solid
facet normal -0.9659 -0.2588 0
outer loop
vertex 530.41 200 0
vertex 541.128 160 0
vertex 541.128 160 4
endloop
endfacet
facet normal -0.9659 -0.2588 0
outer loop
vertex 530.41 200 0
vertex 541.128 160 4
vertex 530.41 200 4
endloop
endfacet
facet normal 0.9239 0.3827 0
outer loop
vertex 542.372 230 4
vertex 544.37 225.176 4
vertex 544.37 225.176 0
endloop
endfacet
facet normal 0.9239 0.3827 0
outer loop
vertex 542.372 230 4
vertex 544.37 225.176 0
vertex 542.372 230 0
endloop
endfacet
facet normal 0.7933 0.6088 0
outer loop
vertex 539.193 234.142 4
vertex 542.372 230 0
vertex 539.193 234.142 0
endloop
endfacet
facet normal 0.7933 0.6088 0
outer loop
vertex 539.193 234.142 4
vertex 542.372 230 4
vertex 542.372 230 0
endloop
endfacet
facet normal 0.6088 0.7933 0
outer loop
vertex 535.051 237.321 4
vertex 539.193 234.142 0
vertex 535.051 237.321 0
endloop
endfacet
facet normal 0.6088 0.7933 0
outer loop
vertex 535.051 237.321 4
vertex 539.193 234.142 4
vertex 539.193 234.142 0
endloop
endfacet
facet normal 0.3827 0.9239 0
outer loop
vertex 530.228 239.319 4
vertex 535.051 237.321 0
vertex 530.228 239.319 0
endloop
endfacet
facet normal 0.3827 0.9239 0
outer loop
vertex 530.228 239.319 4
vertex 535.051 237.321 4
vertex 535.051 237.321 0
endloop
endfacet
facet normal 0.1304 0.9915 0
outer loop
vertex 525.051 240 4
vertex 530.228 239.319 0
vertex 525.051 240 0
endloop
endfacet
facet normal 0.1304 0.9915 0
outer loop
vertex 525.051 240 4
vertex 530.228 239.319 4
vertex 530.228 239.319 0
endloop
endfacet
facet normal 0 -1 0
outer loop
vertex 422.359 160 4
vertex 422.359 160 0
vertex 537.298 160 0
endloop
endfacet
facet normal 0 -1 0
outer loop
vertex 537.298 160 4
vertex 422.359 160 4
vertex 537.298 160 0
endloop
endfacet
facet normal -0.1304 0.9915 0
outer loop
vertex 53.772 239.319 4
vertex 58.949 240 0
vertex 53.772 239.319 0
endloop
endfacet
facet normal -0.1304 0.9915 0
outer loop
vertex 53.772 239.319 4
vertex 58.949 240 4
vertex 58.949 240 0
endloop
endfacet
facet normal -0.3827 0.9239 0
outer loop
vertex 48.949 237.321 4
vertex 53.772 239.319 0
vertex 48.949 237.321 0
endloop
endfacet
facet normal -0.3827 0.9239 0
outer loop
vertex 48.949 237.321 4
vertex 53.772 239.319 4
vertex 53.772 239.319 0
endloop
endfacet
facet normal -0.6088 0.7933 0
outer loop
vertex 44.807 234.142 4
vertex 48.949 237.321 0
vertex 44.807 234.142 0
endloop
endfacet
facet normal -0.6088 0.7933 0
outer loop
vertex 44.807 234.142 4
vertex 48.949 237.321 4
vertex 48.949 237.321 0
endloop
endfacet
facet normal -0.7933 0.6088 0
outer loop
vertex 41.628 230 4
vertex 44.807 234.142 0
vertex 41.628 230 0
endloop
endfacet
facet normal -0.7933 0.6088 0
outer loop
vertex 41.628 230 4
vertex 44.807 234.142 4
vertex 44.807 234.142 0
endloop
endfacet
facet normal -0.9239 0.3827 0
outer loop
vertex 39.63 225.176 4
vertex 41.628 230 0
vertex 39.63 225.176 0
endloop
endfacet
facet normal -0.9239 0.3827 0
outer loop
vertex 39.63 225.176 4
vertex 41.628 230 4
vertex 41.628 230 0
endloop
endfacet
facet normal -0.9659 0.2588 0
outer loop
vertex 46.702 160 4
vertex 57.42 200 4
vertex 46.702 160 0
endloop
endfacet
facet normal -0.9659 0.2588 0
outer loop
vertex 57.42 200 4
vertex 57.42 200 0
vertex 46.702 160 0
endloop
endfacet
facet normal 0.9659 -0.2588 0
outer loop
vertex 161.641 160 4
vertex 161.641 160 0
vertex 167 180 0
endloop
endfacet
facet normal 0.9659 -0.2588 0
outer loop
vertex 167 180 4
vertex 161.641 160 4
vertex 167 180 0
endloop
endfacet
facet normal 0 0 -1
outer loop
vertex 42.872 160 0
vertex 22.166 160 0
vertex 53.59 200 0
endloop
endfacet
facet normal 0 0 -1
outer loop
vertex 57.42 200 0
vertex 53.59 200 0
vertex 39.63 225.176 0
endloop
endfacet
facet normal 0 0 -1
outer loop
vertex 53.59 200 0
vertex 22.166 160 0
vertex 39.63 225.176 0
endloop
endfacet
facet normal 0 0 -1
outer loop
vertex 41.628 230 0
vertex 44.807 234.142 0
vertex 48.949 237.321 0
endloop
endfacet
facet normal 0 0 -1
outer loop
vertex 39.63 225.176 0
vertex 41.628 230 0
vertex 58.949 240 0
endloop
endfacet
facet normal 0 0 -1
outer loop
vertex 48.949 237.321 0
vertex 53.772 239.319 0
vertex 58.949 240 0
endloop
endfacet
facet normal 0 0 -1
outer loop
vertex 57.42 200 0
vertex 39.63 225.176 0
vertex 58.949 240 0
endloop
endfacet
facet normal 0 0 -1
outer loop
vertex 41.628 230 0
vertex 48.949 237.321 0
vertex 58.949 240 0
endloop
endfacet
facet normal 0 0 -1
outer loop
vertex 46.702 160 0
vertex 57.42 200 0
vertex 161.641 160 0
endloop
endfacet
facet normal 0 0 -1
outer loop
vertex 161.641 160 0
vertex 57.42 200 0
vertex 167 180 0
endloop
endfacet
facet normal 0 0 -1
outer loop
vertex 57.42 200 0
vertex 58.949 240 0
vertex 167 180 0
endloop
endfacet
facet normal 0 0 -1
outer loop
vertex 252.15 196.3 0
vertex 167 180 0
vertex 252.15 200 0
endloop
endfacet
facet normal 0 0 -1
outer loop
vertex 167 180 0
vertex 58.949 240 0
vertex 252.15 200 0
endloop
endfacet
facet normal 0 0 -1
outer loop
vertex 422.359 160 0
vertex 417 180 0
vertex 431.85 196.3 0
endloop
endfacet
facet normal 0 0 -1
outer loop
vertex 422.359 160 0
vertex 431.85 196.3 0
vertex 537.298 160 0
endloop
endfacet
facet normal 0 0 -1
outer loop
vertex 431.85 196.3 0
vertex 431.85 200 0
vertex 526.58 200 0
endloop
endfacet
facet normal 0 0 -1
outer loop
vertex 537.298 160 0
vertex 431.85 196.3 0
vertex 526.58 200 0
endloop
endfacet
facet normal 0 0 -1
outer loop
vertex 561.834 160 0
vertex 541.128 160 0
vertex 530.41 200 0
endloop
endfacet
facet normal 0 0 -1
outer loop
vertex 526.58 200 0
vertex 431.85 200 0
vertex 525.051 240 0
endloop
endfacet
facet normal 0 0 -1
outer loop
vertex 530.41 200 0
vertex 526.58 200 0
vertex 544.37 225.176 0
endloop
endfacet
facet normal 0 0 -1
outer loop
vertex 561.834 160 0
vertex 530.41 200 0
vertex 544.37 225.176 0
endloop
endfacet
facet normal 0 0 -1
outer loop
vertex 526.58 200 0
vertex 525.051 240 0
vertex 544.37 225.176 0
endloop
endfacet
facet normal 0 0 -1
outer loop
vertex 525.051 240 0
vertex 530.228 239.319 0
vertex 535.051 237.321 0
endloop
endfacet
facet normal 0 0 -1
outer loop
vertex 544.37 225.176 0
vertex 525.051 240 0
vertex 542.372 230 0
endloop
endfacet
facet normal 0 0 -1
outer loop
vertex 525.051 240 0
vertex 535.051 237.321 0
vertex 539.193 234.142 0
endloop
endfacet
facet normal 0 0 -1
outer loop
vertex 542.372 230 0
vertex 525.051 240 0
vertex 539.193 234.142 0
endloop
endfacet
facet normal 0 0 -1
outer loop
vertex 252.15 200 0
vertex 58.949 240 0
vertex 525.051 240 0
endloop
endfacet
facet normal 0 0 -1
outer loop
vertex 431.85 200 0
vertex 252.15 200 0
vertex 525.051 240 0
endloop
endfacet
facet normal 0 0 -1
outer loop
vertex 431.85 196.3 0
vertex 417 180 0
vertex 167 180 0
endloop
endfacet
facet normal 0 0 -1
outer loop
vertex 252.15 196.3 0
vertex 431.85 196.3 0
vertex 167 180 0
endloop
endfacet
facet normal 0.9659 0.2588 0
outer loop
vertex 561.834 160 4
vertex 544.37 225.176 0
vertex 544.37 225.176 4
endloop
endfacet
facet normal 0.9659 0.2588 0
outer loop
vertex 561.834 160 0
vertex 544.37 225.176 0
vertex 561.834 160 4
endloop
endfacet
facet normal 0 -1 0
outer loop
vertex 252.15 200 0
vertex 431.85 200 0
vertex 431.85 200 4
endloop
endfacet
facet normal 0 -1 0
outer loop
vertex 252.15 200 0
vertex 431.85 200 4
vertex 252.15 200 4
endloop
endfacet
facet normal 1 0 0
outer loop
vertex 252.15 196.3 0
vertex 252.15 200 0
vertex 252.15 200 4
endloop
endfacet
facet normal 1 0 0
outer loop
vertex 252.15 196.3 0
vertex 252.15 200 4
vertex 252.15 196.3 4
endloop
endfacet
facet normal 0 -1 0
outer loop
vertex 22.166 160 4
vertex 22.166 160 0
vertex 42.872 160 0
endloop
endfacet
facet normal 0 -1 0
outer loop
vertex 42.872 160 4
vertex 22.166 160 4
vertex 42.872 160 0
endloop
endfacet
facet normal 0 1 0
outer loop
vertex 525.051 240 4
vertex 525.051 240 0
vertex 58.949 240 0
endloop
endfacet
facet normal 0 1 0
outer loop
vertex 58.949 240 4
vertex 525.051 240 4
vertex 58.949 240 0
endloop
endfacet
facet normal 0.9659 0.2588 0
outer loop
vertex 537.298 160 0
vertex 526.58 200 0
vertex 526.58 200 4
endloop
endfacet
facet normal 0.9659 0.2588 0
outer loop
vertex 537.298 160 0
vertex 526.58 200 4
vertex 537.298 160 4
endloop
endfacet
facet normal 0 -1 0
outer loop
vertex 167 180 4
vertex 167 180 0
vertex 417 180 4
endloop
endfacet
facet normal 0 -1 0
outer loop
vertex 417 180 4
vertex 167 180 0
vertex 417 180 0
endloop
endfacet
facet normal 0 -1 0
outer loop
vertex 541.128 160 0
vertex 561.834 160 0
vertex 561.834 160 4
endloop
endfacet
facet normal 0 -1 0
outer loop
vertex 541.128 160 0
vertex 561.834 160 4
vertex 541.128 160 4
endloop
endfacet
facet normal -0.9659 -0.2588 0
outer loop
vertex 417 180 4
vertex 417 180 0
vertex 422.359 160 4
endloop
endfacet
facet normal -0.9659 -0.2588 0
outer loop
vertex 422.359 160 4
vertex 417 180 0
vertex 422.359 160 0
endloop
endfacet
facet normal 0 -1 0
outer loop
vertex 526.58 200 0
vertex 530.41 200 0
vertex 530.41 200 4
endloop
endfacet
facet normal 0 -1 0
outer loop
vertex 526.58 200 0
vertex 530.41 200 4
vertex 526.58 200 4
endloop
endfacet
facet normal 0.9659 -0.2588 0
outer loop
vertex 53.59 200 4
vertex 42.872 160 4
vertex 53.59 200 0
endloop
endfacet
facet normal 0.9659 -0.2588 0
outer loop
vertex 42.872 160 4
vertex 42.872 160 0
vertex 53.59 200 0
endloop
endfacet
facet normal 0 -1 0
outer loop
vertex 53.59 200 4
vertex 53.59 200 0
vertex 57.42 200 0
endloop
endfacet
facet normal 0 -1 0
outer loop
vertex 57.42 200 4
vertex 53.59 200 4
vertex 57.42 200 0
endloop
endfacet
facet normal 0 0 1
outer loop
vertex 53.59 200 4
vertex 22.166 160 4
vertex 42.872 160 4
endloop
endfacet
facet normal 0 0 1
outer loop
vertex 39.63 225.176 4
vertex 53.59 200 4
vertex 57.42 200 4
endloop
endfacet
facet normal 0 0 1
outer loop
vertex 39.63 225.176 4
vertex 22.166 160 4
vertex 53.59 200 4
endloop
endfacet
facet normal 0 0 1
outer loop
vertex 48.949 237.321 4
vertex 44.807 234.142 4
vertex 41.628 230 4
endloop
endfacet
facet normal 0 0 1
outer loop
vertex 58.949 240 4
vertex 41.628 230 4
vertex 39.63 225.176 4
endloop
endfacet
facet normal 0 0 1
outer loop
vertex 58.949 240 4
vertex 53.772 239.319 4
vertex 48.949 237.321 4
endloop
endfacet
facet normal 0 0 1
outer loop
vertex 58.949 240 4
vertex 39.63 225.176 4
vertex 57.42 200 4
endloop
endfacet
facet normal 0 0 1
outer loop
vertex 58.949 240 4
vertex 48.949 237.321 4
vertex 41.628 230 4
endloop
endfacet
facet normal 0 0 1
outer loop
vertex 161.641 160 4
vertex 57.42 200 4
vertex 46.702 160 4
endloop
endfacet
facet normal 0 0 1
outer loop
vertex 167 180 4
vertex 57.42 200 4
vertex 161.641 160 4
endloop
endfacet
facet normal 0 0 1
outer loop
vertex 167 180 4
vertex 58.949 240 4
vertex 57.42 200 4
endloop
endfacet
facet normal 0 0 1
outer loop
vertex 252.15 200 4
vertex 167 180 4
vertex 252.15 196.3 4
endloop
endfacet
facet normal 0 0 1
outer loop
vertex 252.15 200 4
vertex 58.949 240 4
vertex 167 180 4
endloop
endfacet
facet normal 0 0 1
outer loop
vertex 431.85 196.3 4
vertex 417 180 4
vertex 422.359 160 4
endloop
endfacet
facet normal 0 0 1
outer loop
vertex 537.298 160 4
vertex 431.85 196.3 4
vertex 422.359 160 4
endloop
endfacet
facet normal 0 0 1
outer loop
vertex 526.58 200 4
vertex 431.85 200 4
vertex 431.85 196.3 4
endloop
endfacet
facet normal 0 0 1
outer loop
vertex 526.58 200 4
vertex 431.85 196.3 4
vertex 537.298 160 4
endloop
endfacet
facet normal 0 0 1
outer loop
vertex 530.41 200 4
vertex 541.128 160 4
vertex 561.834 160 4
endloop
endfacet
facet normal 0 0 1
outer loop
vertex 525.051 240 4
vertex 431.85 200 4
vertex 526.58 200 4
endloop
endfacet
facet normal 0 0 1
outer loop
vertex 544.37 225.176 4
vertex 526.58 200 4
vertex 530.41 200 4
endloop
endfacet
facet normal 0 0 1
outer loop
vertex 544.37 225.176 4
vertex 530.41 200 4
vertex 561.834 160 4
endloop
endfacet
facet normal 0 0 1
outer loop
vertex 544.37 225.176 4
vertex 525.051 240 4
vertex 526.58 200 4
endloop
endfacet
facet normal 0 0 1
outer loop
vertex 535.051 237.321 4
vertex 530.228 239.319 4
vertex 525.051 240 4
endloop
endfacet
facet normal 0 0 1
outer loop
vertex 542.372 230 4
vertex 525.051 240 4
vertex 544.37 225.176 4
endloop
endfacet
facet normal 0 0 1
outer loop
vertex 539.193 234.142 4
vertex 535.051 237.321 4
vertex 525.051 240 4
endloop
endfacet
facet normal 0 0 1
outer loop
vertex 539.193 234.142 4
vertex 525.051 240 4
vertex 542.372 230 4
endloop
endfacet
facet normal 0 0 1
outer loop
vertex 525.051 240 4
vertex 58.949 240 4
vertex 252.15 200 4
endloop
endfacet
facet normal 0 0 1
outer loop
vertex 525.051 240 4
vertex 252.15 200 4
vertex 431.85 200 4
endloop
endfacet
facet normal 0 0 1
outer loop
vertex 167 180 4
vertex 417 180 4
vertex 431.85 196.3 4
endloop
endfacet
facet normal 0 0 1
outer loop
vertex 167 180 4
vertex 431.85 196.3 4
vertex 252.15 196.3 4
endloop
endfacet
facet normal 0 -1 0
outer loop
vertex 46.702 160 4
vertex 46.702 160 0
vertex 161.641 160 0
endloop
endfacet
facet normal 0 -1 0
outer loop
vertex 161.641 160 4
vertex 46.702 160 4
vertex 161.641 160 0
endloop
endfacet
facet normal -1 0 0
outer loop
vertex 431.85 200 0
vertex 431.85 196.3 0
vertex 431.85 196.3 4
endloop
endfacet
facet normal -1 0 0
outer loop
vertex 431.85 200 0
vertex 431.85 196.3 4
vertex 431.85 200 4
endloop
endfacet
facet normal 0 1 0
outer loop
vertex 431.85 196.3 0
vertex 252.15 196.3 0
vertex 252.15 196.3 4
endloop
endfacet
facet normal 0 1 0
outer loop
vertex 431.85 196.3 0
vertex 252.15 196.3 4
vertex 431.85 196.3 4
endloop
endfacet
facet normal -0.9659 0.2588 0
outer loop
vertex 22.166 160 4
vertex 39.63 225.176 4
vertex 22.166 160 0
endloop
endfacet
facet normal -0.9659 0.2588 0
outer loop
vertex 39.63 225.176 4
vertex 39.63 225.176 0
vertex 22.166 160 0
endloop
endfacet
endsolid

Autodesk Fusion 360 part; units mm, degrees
sketch "Schizzo1" plane through (0, 0, 0) normal (0, 0, 1) x (1, 0, 0)
  line L0 (0, 0) -> (80.3848, 300) construction
  line L1 (80.3848, 300) -> (503.6152, 300) construction
  line L2 (503.6152, 300) -> (584, 0) construction
  line L3 (584, 0) -> (0, 0) construction
  line L4 (53.5898, 200) -> (530.4102, 200) construction
  line L5 (42.8719, 160) -> (541.1281, 160)
  line L6 (64.3078, 240) -> (519.6922, 240)
  line L7 (64.3078, 240) -> (43.6023, 240)
  line L8 (43.6023, 240) -> (22.1663, 160)
  line L9 (22.1663, 160) -> (42.8719, 160)
  line L10 (42.8719, 160) -> (53.5898, 200)
  line L11 (53.5898, 200) -> (57.4204, 200)
  line L12 (57.4204, 200) -> (46.7024, 160)
  line L13 (519.6922, 240) -> (540.3977, 240)
  line L14 (540.3977, 240) -> (561.8337, 160)
  line L15 (561.8337, 160) -> (541.1281, 160)
  line L16 (541.1281, 160) -> (530.4102, 200)
  line L17 (530.4102, 200) -> (526.5796, 200)
  line L18 (526.5796, 200) -> (537.2976, 160)
  line L19 (161.641, 160) -> (167, 180)
  line L20 (167, 180) -> (417, 180)
  line L21 (417, 180) -> (422.359, 160)
  line L22 (292, 180) -> (292, 160) construction
  line L23 (292, 200) -> (252.15, 200)
  line L24 (252.15, 200) -> (252.15, 196.3)
  line L25 (252.15, 196.3) -> (431.85, 196.3)
  line L26 (431.85, 196.3) -> (431.85, 200)
  line L27 (292, 200) -> (431.85, 200)
  dimension "d1" = 75
  dimension "d2" = 75
  dimension "d3" = 584
  dimension "d4" = 300
  dimension "d5" = 200
  dimension "d6" = 40
  dimension "d7" = 40
  dimension "d8" = 3.7
  dimension "d11" = 3.7
  dimension "d12" = 20
  dimension "d13" = 20
  dimension "d14" = 20
  dimension "d15" = 250
  dimension "d20" = 3.7
  dimension "d22" = 139.85
  dimension "d23" = 39.85
extrude "Estrusione1" add sketch "Schizzo1" along normal blind 4 contours L5 L6 L7 L8 L9 L10 L11 L12 L13 L14 L15 L16 L17 L18 L19 L20 L21
fillet "Raccordo1" radius 20 2 edges at (43.6023, 240, 2) (540.3977, 240, 2)
component "Component" placed x (1, 0, 0) y (0, 1, 0) z (0, 0, 1) at (0, 0, 0)
equation "d8 = h - 2 * t"
equation "h = 4 mm"
equation "t = 0.15 mm"
equation "d11 = h - 2 * t"
equation "d16 = h"
equation "d20 = h - 2 * t"
equation "d22 = 140 mm - t"
equation "d23 = 40 mm - t"
